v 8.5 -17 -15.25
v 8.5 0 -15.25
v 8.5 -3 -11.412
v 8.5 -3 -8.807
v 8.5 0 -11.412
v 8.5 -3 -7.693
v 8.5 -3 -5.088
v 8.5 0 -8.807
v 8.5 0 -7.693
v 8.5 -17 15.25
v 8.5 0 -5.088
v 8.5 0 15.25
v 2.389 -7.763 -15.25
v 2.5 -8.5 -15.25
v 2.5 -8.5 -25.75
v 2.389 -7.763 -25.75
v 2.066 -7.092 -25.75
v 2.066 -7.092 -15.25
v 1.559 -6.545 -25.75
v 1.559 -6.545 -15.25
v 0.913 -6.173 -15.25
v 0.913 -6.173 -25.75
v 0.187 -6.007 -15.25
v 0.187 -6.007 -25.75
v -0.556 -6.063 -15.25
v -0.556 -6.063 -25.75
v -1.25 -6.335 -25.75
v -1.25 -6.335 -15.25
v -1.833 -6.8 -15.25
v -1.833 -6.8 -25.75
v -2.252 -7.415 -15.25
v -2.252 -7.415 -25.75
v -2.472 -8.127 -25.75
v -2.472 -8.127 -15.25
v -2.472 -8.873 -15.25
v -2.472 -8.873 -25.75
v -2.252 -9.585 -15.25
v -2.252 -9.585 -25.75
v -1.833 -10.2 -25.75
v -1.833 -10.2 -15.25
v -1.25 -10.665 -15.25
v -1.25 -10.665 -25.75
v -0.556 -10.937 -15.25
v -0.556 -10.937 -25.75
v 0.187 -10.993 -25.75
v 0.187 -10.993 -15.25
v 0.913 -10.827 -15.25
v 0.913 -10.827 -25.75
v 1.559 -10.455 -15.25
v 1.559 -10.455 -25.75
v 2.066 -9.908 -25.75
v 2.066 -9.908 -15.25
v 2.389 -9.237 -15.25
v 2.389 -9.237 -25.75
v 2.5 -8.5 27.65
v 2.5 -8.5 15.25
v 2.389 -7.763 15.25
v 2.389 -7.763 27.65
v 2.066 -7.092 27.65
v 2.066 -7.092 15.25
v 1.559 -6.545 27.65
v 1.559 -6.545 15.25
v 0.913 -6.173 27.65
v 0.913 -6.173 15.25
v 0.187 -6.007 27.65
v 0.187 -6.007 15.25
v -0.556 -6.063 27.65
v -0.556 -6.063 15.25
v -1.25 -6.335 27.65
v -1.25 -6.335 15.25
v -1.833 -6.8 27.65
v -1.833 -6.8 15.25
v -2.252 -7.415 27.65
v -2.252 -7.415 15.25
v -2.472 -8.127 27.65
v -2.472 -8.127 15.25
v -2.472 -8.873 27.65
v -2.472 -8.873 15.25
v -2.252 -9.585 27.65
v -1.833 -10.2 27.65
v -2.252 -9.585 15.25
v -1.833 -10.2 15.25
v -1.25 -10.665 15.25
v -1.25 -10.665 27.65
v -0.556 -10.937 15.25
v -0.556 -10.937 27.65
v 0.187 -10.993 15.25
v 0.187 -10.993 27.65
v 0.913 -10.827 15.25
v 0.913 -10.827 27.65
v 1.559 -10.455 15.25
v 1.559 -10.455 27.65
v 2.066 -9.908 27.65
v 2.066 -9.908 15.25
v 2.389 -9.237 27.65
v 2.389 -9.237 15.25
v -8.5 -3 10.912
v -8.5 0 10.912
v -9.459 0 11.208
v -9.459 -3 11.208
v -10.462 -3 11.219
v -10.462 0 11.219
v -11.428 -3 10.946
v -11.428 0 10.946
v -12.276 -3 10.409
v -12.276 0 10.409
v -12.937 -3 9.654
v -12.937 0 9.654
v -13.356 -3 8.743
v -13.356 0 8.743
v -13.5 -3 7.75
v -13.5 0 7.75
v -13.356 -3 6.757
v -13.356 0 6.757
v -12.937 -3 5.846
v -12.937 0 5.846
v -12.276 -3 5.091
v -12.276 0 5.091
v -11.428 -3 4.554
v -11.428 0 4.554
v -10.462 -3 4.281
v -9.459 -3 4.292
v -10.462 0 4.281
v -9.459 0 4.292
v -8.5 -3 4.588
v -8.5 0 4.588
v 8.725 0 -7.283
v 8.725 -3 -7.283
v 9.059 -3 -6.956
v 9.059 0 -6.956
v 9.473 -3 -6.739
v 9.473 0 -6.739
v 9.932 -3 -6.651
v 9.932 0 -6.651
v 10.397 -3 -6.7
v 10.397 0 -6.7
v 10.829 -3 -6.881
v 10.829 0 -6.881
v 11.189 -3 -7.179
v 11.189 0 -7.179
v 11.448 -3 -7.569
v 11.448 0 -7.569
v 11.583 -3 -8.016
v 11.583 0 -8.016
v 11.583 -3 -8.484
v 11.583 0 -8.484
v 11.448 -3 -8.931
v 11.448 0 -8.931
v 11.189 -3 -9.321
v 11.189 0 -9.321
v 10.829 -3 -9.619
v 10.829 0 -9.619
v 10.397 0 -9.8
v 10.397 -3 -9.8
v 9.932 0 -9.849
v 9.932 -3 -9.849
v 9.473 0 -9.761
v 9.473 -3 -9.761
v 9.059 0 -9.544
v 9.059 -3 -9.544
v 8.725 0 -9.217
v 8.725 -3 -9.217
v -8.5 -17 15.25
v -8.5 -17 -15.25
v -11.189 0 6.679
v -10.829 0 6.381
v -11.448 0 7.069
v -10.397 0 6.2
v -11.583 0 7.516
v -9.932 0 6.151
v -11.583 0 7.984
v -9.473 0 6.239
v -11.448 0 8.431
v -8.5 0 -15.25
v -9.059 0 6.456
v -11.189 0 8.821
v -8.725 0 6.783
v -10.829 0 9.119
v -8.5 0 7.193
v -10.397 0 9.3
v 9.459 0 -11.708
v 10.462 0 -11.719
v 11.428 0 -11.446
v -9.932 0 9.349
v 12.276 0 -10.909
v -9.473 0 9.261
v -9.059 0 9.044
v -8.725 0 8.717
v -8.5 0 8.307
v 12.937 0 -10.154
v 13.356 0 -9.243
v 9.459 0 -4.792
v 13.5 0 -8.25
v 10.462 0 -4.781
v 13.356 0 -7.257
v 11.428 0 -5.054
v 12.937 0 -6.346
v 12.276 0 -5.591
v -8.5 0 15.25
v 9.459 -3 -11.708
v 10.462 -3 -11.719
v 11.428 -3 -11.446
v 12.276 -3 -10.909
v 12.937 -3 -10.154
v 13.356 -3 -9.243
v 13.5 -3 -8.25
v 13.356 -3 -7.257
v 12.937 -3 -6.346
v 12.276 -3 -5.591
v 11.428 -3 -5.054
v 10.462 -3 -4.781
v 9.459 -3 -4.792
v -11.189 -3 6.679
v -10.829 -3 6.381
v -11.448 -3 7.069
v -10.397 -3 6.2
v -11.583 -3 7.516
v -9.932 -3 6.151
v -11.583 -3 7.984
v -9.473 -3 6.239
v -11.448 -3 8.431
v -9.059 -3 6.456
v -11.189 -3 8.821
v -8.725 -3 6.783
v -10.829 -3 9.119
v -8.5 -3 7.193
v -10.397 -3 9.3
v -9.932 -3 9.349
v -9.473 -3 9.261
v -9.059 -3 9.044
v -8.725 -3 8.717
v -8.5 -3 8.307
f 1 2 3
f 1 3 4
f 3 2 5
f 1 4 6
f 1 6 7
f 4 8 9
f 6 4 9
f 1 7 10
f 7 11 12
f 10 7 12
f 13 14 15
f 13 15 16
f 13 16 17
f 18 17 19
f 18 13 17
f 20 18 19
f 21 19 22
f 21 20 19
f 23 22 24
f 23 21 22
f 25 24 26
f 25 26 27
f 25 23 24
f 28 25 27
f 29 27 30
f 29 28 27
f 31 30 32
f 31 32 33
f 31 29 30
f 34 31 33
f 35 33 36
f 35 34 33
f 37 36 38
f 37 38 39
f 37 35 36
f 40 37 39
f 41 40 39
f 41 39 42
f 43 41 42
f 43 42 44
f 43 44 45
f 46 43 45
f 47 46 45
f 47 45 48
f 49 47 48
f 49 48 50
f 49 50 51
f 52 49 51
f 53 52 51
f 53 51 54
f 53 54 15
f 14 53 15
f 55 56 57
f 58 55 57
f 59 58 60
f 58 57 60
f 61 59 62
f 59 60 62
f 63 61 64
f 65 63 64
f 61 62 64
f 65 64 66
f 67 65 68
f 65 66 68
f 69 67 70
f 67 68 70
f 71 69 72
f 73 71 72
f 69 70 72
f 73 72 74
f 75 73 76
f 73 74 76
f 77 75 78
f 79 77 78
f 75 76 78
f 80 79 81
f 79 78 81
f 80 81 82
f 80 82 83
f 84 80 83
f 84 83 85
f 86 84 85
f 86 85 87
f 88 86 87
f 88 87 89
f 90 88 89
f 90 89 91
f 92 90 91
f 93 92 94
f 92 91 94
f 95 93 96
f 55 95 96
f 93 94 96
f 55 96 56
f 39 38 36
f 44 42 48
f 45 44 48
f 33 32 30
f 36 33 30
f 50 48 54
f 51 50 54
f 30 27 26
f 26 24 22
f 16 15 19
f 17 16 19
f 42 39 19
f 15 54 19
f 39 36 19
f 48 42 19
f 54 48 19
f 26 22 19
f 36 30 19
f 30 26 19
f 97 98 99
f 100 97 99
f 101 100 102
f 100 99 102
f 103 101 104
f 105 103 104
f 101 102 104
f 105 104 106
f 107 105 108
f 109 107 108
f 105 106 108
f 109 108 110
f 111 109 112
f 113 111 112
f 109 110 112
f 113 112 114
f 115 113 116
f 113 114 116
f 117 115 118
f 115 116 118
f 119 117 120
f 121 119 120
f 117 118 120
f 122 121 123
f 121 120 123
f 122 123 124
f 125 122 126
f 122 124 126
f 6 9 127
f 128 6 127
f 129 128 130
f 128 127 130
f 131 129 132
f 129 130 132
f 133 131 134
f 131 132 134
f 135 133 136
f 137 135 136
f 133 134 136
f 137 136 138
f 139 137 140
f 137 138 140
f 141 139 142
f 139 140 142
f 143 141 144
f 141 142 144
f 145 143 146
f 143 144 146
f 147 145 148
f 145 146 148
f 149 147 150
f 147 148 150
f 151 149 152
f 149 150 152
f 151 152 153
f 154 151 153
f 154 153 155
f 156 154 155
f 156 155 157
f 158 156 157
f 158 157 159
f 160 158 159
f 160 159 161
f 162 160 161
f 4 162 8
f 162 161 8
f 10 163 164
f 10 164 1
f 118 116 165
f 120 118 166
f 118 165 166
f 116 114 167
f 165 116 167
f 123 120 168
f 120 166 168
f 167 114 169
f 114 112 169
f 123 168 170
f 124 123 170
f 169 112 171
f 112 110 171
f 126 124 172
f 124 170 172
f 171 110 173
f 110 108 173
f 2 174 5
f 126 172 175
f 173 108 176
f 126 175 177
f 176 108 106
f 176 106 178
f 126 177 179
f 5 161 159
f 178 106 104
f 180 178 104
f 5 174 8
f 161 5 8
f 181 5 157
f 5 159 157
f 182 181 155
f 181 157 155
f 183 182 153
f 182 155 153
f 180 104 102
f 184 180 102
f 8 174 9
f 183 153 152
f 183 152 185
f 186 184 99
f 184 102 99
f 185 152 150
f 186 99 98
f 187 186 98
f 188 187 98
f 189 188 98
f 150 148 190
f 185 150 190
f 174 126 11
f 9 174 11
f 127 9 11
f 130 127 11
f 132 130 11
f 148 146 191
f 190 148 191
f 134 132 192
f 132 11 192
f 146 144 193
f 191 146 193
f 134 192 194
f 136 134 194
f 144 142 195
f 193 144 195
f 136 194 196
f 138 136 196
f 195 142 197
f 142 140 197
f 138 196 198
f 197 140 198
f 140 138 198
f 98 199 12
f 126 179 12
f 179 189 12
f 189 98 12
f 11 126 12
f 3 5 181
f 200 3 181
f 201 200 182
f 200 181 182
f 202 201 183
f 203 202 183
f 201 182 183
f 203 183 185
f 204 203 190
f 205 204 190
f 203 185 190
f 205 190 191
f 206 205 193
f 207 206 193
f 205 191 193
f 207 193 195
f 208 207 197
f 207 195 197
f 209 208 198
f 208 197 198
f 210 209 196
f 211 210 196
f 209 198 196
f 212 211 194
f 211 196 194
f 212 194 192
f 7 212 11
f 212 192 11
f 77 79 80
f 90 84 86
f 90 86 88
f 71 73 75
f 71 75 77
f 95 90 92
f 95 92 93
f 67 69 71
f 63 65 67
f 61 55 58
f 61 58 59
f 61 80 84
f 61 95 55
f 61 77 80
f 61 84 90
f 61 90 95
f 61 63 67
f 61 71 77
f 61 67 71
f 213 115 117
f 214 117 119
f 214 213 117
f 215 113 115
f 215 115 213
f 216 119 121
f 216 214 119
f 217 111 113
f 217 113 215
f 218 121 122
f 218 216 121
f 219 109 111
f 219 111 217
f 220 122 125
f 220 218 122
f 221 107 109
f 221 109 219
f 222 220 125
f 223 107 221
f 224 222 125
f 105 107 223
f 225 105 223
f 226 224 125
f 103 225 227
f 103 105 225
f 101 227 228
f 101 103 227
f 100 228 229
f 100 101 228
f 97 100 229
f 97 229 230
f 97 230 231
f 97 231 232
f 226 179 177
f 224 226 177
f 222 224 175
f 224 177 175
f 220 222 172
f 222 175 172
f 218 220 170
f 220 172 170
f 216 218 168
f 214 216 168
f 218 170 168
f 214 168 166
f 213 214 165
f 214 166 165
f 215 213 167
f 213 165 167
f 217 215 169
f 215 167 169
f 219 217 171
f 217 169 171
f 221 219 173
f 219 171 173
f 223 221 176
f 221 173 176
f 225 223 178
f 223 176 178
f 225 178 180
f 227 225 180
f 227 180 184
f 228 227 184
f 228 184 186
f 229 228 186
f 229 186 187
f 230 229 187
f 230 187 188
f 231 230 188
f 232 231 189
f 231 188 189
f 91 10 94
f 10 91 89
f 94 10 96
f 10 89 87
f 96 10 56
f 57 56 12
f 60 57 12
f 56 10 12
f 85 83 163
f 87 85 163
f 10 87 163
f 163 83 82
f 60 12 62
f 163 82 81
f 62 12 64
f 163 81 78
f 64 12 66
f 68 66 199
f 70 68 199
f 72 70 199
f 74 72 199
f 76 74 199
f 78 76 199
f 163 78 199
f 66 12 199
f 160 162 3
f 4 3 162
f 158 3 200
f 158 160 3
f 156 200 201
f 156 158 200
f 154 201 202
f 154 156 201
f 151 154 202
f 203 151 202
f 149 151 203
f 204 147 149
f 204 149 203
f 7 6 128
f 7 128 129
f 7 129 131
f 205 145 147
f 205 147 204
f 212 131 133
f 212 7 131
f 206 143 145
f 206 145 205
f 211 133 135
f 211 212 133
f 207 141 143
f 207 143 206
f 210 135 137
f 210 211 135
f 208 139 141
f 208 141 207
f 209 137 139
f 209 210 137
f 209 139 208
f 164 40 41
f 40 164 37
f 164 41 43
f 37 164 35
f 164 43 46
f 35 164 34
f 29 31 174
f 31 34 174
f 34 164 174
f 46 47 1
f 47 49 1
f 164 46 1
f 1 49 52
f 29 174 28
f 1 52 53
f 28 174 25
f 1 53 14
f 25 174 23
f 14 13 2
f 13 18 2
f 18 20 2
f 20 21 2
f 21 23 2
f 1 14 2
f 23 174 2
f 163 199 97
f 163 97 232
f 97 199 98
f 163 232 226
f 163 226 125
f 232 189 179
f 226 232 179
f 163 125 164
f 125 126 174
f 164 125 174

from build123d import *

# Parameters (mm, degrees)
F1_DEPTH = 17
F2_DEPTH = 3
F3_R     = 2.5
F4_DEPTH = 12.4
F5_DEPTH = 41


with BuildPart() as f1:
    # F0 (on Front) → F1 (new body)
    with BuildSketch(Plane.XZ):
        Polygon((8.5, 15.25), (-8.5, 15.25), (-8.5, 10.912278), (-8.5, 8.306776), (-8.5, 7.193224), (-8.5, 4.587722), (-8.5, -15.25), (8.5, -15.25), (8.5, -11.412278), (8.5, -8.806776), (8.5, -7.693224), (8.5, -5.087722), align=None)
    extrude(amount=F1_DEPTH)

    # F0 (on Front) → F2 (join)
    with BuildSketch(Plane.XZ):
        with BuildLine():
            Line((-8.5, 8.306776), (-8.5, 10.912278))
            ThreePointArc((-8.5, 10.912278), (-13.5, 7.75), (-8.5, 4.587722))
            Line((-8.5, 4.587722), (-8.5, 7.193224))
            ThreePointArc((-8.5, 7.193224), (-11.6, 7.75), (-8.5, 8.306776))
        make_face()
        with BuildLine():
            ThreePointArc((8.5, -11.412278), (13.5, -8.25), (8.5, -5.087722))
            Line((8.5, -5.087722), (8.5, -7.693224))
            ThreePointArc((8.5, -7.693224), (11.6, -8.25), (8.5, -8.806776))
            Line((8.5, -8.806776), (8.5, -11.412278))
        make_face()
    extrude(amount=F2_DEPTH)

    # F3 (on face) → F4 (join)
    with BuildSketch(Plane.XY.offset(15.25)):
        with Locations((0, -8.5)):
            Circle(F3_R)
    extrude(amount=F4_DEPTH)

    # F3 (on face) → F5 (join)
    with BuildSketch(Plane.XY.offset(15.25)):
        with Locations((0, -8.5)):
            Circle(F3_R)
    extrude(amount=-F5_DEPTH)


solid = f1.part
